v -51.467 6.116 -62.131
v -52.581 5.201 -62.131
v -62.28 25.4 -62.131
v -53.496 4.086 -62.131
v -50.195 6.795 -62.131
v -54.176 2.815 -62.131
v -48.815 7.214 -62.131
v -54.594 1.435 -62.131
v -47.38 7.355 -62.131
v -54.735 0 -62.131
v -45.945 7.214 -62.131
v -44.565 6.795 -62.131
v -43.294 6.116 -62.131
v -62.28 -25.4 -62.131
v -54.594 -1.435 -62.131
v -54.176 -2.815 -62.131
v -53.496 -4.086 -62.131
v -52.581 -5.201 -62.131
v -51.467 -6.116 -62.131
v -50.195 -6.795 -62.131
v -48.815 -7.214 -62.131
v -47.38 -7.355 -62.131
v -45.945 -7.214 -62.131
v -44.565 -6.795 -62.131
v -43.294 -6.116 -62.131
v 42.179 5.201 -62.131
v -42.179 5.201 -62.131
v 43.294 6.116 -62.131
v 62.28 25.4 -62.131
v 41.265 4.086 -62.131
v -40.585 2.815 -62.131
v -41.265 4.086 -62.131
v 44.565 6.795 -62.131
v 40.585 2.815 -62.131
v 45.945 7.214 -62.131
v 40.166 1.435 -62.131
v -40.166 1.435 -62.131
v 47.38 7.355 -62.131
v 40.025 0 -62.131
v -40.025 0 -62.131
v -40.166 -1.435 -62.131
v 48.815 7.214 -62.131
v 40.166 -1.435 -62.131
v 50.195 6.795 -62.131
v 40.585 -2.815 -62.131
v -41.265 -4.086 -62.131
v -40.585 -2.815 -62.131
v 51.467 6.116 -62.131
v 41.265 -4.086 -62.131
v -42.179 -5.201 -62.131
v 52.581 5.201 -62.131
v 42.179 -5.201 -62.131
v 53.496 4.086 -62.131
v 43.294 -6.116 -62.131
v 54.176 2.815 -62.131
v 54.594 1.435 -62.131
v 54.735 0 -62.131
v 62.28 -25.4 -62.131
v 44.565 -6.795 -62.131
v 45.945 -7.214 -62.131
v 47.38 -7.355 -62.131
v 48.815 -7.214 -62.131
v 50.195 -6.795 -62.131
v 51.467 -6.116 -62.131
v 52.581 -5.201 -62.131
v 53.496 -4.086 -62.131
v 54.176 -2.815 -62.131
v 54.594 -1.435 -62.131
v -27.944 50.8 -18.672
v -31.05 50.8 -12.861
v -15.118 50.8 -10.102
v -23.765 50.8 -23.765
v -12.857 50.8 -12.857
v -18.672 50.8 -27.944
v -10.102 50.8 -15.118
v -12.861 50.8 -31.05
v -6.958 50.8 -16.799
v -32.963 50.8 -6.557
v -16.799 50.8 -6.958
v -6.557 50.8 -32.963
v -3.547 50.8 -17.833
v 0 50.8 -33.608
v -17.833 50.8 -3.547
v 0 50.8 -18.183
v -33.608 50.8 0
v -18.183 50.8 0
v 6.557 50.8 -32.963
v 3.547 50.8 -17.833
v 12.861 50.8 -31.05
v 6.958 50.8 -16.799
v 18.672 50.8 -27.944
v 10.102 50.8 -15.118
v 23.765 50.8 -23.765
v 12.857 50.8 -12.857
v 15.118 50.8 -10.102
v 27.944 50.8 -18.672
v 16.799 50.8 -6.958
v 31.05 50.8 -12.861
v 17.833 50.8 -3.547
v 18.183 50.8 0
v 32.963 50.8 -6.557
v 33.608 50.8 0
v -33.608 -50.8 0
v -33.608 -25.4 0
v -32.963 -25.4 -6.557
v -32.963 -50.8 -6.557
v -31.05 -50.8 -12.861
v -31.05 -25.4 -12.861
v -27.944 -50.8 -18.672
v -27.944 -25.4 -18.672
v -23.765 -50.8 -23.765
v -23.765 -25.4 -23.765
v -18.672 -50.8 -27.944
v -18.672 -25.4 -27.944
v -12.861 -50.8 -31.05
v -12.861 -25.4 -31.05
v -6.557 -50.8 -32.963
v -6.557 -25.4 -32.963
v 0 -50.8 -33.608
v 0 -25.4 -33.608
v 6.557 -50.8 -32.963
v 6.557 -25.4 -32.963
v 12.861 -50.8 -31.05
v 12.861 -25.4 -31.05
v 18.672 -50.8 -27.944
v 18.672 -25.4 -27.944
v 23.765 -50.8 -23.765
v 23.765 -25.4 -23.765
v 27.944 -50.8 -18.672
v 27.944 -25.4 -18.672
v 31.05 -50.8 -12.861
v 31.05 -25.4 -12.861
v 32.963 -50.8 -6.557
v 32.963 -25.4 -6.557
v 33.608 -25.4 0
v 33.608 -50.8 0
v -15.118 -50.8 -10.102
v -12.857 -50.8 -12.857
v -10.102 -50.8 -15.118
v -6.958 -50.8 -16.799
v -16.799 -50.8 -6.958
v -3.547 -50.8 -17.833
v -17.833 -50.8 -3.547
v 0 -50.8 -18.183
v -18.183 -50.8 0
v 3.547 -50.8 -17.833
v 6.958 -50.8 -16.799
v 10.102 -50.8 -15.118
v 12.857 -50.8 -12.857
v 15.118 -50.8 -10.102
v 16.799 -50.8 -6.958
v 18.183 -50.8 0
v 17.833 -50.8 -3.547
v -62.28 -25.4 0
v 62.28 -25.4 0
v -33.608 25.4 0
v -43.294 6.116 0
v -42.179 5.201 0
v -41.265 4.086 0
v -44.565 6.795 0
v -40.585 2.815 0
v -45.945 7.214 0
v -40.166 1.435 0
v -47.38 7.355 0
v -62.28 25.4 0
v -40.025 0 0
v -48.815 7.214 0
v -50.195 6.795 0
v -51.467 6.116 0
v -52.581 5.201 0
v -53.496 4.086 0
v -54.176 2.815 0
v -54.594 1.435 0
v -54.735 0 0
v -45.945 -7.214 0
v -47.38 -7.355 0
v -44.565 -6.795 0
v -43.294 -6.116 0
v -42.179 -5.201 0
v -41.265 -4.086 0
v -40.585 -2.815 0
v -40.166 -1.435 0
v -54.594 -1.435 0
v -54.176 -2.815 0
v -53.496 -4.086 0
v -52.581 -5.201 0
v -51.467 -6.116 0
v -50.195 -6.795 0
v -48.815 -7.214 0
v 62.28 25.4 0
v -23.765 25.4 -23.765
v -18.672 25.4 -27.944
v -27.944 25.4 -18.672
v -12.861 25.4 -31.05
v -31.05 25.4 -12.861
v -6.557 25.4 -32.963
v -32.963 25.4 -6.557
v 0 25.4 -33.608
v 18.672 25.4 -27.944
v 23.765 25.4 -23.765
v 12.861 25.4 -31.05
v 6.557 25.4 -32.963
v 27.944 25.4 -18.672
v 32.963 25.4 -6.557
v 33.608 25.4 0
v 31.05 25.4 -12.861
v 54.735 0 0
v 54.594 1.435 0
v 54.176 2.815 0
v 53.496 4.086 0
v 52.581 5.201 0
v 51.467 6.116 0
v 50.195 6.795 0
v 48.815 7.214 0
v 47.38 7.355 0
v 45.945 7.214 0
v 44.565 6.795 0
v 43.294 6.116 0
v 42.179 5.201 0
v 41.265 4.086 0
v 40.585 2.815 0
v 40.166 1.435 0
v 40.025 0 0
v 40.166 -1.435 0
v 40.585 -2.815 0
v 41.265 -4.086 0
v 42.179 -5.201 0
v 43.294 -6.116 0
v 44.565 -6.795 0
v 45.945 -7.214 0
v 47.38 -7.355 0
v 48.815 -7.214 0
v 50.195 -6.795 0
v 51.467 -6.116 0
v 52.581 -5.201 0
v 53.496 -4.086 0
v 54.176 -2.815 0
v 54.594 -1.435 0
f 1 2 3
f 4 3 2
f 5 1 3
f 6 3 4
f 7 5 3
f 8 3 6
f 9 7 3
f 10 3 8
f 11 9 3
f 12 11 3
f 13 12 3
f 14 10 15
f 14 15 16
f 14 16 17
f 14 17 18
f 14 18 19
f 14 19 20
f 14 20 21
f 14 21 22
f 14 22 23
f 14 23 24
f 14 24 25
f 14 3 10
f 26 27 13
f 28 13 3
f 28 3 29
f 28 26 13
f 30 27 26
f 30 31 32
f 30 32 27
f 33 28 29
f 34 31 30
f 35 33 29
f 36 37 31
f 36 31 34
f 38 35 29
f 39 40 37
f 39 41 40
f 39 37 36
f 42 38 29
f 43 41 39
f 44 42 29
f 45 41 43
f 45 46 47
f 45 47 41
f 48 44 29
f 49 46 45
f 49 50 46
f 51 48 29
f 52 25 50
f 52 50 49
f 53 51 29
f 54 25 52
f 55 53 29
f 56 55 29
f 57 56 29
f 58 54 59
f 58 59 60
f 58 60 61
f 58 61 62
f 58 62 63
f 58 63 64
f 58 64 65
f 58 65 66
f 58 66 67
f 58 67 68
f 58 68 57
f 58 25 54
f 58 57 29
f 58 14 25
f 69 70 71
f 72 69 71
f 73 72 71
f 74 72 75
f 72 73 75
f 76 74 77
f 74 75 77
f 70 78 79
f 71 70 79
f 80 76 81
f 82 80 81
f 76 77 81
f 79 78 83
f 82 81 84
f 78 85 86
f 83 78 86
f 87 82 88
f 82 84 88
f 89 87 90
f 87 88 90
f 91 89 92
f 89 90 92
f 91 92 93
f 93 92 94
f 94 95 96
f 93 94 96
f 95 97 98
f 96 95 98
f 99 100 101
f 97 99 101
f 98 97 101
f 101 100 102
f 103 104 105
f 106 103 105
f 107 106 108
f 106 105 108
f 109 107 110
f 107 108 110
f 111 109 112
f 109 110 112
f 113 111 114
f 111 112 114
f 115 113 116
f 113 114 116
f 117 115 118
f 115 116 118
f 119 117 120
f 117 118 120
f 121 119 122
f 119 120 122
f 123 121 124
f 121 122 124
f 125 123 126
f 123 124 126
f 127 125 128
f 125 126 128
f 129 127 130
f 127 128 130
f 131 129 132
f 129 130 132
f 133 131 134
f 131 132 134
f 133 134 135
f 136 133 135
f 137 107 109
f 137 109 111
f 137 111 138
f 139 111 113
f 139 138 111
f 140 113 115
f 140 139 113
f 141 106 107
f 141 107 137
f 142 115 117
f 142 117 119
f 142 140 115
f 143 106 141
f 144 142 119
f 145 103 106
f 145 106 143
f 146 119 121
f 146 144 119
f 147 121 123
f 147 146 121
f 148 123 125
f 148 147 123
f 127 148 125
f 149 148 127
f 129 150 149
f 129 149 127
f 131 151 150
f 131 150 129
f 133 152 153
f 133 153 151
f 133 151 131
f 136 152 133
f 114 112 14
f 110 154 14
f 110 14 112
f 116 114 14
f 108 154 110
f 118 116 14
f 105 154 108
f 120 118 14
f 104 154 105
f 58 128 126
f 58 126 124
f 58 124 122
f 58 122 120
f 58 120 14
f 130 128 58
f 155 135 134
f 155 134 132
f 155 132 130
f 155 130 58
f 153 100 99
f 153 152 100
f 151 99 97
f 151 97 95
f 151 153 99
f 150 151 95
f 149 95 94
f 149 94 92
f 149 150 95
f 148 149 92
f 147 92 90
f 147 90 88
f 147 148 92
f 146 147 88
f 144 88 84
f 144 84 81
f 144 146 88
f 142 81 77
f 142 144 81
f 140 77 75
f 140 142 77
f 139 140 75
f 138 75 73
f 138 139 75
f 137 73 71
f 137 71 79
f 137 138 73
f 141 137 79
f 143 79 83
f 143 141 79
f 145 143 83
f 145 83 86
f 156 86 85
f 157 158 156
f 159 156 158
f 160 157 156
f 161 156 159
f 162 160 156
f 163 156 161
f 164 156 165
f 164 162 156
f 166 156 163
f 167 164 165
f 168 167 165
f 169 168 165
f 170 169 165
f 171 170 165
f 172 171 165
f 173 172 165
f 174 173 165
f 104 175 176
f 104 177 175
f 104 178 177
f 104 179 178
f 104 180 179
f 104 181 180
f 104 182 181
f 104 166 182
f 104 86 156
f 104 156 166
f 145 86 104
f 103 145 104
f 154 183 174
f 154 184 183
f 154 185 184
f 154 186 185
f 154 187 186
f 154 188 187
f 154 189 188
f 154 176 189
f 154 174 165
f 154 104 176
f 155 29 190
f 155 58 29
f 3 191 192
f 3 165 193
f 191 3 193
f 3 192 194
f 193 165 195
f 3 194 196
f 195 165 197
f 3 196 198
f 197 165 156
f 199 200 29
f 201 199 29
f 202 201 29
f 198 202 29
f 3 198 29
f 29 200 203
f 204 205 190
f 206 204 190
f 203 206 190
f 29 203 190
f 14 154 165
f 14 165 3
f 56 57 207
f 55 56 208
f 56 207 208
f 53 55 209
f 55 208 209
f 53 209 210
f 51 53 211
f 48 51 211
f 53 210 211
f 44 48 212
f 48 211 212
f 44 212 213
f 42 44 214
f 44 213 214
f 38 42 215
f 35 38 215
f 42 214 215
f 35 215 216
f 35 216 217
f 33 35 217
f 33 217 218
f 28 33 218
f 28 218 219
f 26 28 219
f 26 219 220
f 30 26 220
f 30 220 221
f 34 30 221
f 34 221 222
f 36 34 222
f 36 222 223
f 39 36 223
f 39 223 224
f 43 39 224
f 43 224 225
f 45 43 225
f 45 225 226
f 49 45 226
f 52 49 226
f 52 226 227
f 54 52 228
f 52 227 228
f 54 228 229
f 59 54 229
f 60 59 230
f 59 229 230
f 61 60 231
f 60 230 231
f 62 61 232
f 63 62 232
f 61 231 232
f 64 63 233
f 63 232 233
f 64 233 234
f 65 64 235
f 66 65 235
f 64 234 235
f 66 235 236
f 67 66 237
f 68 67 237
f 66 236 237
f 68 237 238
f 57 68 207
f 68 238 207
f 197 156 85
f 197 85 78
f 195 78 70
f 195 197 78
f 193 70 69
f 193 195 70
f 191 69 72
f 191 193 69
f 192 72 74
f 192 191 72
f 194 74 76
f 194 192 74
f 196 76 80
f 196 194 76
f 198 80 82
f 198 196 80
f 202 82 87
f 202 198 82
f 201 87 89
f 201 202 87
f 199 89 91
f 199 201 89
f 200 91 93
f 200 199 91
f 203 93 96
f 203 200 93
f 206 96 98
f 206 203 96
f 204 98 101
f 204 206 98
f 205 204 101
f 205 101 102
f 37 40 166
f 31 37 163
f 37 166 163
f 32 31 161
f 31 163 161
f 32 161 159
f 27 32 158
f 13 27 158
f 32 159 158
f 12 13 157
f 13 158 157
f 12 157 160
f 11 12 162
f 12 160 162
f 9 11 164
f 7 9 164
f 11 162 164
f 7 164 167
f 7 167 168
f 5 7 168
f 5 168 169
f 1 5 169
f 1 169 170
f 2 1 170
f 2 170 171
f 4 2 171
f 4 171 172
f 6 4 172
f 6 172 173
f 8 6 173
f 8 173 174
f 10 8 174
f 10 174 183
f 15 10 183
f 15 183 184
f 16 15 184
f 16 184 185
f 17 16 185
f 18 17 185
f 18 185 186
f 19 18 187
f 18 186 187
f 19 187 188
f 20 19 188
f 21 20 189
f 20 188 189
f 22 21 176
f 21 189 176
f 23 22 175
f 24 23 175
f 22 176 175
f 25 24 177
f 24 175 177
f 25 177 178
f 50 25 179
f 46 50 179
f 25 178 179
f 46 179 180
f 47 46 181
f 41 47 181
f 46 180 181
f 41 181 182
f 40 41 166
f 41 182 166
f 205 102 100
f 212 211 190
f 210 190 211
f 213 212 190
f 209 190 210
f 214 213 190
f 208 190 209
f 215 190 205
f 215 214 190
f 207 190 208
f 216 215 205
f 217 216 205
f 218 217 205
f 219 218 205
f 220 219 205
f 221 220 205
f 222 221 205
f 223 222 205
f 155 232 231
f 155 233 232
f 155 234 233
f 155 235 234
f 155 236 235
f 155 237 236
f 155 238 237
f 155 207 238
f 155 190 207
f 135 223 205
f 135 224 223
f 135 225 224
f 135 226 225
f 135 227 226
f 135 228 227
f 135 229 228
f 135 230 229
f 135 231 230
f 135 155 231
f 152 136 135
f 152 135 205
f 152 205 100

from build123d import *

# Parameters (mm, degrees)
F1_DEPTH = 25.4
F2_DEPTH = 50.8
F4_R     = 7.355255
F5_DEPTH = 62.131667


with BuildPart() as f1:
    # F0 (on Front) → F1 (new body)
    with BuildSketch(Plane.XZ):
        with BuildLine():
            Line((-62.279664, 0), (-62.279664, -62.130667))
            Line((-62.279664, -62.130667), (62.279664, -62.130667))
            Line((62.279664, -62.130667), (62.279664, 0))
            Line((62.279664, 0), (33.608398, 0))
            ThreePointArc((33.608398, 0), (0, -33.608398), (-33.608398, 0))
            Line((-33.608398, 0), (-62.279664, 0))
        make_face()
        with BuildLine():
            Line((-18.182814, 0), (-33.608398, 0))
            ThreePointArc((-33.608398, 0), (0, -33.608398), (33.608398, 0))
            Line((33.608398, 0), (18.182814, 0))
            ThreePointArc((18.182814, 0), (0, -18.182814), (-18.182814, 0))
        make_face()
    extrude(amount=F1_DEPTH)

    # F0 (on Front) → F2 (join)
    with BuildSketch(Plane.XZ):
        with BuildLine():
            Line((-18.182814, 0), (-33.608398, 0))
            ThreePointArc((-33.608398, 0), (0, -33.608398), (33.608398, 0))
            Line((33.608398, 0), (18.182814, 0))
            ThreePointArc((18.182814, 0), (0, -18.182814), (-18.182814, 0))
        make_face()
    extrude(amount=F2_DEPTH)

    # F3: F1 across plane


with BuildPart() as f1_1:
    add(f1.part)
    add(f1.part.mirror(Plane.XZ))

    # F4 (on face) → F5 (cut, through all)
    with BuildSketch(Plane.XY):
        with Locations((-47.380224, 0)):
            Circle(F4_R)
        with Locations((47.380224, 0)):
            Circle(F4_R)
    extrude(amount=-F5_DEPTH, mode=Mode.SUBTRACT)


solid = f1_1.part
